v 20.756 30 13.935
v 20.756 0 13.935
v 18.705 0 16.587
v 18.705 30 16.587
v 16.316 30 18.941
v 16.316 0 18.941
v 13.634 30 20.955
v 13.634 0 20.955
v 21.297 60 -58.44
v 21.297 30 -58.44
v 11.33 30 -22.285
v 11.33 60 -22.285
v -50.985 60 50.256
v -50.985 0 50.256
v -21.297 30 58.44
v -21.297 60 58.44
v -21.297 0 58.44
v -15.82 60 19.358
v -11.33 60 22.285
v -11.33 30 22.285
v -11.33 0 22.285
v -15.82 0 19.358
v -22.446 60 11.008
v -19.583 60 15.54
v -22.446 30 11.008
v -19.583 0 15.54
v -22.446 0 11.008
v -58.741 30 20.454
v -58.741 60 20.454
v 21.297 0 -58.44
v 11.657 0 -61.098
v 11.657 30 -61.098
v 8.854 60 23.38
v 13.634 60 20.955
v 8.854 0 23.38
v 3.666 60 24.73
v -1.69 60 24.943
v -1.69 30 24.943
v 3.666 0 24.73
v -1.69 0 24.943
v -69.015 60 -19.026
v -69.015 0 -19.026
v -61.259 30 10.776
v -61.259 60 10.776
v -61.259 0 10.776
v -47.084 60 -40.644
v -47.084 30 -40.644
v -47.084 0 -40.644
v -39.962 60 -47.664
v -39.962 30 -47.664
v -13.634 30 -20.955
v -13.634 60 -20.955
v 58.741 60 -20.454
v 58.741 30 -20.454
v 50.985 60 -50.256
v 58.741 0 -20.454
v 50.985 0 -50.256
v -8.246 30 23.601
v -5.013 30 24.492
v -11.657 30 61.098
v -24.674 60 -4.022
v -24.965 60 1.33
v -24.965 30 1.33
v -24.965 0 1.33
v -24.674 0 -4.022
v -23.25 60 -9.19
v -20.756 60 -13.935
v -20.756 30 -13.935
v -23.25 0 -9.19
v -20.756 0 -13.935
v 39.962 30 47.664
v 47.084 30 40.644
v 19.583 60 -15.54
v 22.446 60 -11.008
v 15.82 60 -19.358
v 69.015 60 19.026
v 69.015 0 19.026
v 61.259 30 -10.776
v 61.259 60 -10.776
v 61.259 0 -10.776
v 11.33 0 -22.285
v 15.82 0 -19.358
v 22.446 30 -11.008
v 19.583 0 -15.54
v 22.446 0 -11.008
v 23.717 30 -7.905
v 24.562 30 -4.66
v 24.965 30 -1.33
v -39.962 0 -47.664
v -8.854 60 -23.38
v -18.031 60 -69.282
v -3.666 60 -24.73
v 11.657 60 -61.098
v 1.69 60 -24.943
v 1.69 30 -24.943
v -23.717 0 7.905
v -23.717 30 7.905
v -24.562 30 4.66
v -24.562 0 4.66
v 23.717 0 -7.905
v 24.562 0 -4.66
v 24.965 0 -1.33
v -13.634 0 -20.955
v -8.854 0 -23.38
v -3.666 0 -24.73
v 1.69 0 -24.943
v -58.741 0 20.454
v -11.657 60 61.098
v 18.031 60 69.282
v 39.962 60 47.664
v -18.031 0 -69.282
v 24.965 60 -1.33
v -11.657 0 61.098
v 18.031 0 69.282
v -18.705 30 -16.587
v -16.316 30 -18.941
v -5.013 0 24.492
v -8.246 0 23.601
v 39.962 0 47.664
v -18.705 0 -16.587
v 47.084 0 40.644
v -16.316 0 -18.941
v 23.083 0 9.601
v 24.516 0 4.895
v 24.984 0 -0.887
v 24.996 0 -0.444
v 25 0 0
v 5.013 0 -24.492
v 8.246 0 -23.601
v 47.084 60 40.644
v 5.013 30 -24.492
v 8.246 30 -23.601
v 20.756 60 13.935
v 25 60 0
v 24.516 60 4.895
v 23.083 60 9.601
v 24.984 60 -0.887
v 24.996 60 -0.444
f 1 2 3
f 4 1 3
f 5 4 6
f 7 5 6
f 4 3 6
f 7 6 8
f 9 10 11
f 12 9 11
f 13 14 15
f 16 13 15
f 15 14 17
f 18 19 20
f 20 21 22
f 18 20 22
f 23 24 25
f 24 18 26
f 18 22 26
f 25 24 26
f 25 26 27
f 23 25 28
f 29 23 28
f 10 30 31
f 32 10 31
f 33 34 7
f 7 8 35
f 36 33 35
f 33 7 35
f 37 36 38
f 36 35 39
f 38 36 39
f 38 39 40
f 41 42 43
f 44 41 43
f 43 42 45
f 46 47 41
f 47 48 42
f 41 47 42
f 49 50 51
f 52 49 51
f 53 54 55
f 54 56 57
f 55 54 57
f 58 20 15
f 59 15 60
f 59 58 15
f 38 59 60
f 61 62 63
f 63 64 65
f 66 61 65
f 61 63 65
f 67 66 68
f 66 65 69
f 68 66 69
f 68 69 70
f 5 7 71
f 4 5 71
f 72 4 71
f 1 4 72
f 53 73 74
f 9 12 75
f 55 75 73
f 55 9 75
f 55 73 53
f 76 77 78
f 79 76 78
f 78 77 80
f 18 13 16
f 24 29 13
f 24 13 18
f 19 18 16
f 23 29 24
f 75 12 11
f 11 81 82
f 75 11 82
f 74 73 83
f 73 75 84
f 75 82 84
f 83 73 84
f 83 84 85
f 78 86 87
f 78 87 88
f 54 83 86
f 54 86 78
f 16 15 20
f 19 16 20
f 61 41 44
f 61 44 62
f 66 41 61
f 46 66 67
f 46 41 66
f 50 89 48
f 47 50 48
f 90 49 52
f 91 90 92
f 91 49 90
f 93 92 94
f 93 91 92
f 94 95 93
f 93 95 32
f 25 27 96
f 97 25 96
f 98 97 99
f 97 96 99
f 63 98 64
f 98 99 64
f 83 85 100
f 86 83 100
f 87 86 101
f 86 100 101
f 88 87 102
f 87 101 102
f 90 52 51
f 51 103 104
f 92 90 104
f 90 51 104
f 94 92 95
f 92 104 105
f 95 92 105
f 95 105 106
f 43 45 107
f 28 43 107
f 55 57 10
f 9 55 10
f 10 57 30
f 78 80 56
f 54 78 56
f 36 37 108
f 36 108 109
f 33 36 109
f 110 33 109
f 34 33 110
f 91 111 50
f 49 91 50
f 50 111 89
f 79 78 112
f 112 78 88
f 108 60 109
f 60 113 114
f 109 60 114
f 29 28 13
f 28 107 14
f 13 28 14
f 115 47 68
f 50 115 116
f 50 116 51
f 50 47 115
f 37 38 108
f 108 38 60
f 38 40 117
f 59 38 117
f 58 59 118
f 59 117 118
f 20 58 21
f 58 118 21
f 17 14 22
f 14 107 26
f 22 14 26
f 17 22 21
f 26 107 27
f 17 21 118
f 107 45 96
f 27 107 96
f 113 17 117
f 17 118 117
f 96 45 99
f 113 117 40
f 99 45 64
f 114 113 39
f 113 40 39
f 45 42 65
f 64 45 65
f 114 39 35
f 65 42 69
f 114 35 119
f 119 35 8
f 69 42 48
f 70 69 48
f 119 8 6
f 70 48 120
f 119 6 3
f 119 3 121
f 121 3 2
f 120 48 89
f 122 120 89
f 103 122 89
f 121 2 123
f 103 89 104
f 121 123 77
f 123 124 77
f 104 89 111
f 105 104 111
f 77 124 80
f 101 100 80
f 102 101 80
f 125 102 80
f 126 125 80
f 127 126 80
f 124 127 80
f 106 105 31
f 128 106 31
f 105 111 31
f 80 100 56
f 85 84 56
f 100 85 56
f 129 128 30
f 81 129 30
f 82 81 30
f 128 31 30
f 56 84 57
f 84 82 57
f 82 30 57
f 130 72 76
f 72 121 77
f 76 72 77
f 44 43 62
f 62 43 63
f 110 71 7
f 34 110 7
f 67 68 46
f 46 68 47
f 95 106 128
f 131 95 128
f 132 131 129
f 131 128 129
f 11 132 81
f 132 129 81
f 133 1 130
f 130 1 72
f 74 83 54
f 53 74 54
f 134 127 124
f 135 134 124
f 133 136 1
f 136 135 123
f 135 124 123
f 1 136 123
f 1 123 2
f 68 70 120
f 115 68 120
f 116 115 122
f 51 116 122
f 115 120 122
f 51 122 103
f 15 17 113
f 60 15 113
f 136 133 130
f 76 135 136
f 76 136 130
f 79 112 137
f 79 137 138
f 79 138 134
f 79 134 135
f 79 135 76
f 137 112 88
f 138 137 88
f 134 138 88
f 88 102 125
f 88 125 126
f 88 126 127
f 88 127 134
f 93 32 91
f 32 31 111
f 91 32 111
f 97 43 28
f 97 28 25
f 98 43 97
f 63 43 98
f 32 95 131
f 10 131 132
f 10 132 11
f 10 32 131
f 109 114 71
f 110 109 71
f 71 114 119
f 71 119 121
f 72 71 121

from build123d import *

# Parameters (mm, degrees)
BOSS_EXTRUDE1_DEPTH   = 60
BOSS_EXTRUDE1_2_DEPTH = 60
BOSS_EXTRUDE1_3_DEPTH = 60
BOSS_EXTRUDE1_4_DEPTH = 60
BOSS_EXTRUDE1_5_DEPTH = 60
BOSS_EXTRUDE1_6_DEPTH = 60
BOSS_EXTRUDE2_DEPTH   = 30


with BuildPart() as part:
    # Sketch2 → Boss-Extrude1 (new body)
    with BuildSketch(Plane(origin=(0, 0, 0), x_dir=(1, 0, 0), z_dir=(0, 1, 0))):
        with BuildLine():
            Line((22.445988761, 11.008069246), (58.740707334, 20.453692353))
            Line((58.740707334, 20.453692353), (50.984749422, 50.255888195))
            Line((50.984749422, 50.255888195), (21.297311778, 58.440129534))
            Line((21.297311778, 58.440129534), (11.330102056, 22.285169674))
            ThreePointArc((11.330102056, 22.285169674), (17.804474894, 17.54994797), (22.445988761, 11.008069246))
        make_face()
    extrude(amount=BOSS_EXTRUDE1_DEPTH)



with BuildPart() as body_2:
    # Sketch2 → Boss-Extrude1 2 (new body)
    with BuildSketch(Plane(origin=(0, 0, 0), x_dir=(1, 0, 0), z_dir=(0, 1, 0))):
        with BuildLine():
            Line((69.015250578, -19.026144108), (61.259292666, 10.776051735))
            Line((61.259292666, 10.776051735), (24.964574093, 1.330428629))
            ThreePointArc((24.964574093, 1.330428629), (24.100938224, -6.644153574), (20.756261995, -13.934761857))
            Line((20.756261995, -13.934761857), (47.083770846, -40.644098611))
            Line((47.083770846, -40.644098611), (69.015250578, -19.026144108))
        make_face()
    extrude(amount=BOSS_EXTRUDE1_2_DEPTH)


with BuildPart() as body_3:
    # Sketch2 → Boss-Extrude1 3 (new body)
    with BuildSketch(Plane(origin=(0, 0, 0), x_dir=(1, 0, 0), z_dir=(0, 1, 0))):
        with BuildLine():
            ThreePointArc((-13.634472037, 20.954741045), (-6.29646333, 24.194101544), (1.689726767, 24.942831103))
            Line((1.689726767, 24.942831103), (11.656936488, 61.097790964))
            Line((11.656936488, 61.097790964), (-18.030501156, 69.282032303))
            Line((-18.030501156, 69.282032303), (-39.961980888, 47.664077799))
            Line((-39.961980888, 47.664077799), (-13.634472037, 20.954741045))
        make_face()
    extrude(amount=BOSS_EXTRUDE1_3_DEPTH)


with BuildPart() as body_4:
    # Sketch2 → Boss-Extrude1 4 (new body)
    with BuildSketch(Plane(origin=(0, 0, 0), x_dir=(1, 0, 0), z_dir=(0, 1, 0))):
        with BuildLine():
            Line((18.030501156, -69.282032303), (39.961980888, -47.664077799))
            Line((39.961980888, -47.664077799), (13.634472037, -20.954741045))
            ThreePointArc((13.634472037, -20.954741045), (6.29646333, -24.194101544), (-1.689726767, -24.942831103))
            Line((-1.689726767, -24.942831103), (-11.656936488, -61.097790964))
            Line((-11.656936488, -61.097790964), (18.030501156, -69.282032303))
        make_face()
    extrude(amount=BOSS_EXTRUDE1_4_DEPTH)


with BuildPart() as body_5:
    # Sketch2 → Boss-Extrude1 5 (new body)
    with BuildSketch(Plane(origin=(0, 0, 0), x_dir=(1, 0, 0), z_dir=(0, 1, 0))):
        with BuildLine():
            ThreePointArc((-24.964574093, -1.330428629), (-24.100938224, 6.644153574), (-20.756261995, 13.934761857))
            Line((-20.756261995, 13.934761857), (-47.083770846, 40.644098611))
            Line((-47.083770846, 40.644098611), (-69.015250578, 19.026144108))
            Line((-69.015250578, 19.026144108), (-61.259292666, -10.776051735))
            Line((-61.259292666, -10.776051735), (-24.964574093, -1.330428629))
        make_face()
    extrude(amount=BOSS_EXTRUDE1_5_DEPTH)


with BuildPart() as body_6:
    # Sketch2 → Boss-Extrude1 6 (new body)
    with BuildSketch(Plane(origin=(0, 0, 0), x_dir=(1, 0, 0), z_dir=(0, 1, 0))):
        with BuildLine():
            Line((-21.297311778, -58.440129534), (-11.330102056, -22.285169674))
            ThreePointArc((-11.330102056, -22.285169674), (-17.804474894, -17.54994797), (-22.445988761, -11.008069246))
            Line((-22.445988761, -11.008069246), (-58.740707334, -20.453692353))
            Line((-58.740707334, -20.453692353), (-50.984749422, -50.255888195))
            Line((-50.984749422, -50.255888195), (-21.297311778, -58.440129534))
        make_face()
    extrude(amount=BOSS_EXTRUDE1_6_DEPTH)


with BuildPart() as part_1:
    add(part.part)

    add(body_2.part)  # Boss-Extrude2 merges body 2

    add(body_3.part)  # Boss-Extrude2 merges body 3

    add(body_4.part)  # Boss-Extrude2 merges body 4

    add(body_5.part)  # Boss-Extrude2 merges body 5

    add(body_6.part)  # Boss-Extrude2 merges body 6
    # Sketch2<3> → Boss-Extrude2 (add)
    with BuildSketch(Plane(origin=(0, 0, 0), x_dir=(1, 0, 0), z_dir=(0, 1, 0))):
        with BuildLine():
            Line((61.259292666, 10.776051735), (58.740707334, 20.453692353))
            Line((58.740707334, 20.453692353), (22.445988761, 11.008069246))
            ThreePointArc((22.445988761, 11.008069246), (24.194101544, 6.29646333), (24.964574093, 1.330428629))
            Line((24.964574093, 1.330428629), (61.259292666, 10.776051735))
        make_face()
        with BuildLine():
            ThreePointArc((1.689726767, 24.942831103), (6.644153574, 24.100938224), (11.330102056, 22.285169674))
            Line((11.330102056, 22.285169674), (21.297311778, 58.440129534))
            Line((21.297311778, 58.440129534), (11.656936488, 61.097790964))
            Line((11.656936488, 61.097790964), (1.689726767, 24.942831103))
        make_face()
        with BuildLine():
            Line((39.961980888, -47.664077799), (47.083770846, -40.644098611))
            Line((47.083770846, -40.644098611), (20.756261995, -13.934761857))
            ThreePointArc((20.756261995, -13.934761857), (17.54994797, -17.804474894), (13.634472037, -20.954741045))
            Line((13.634472037, -20.954741045), (39.961980888, -47.664077799))
        make_face()
        with BuildLine():
            ThreePointArc((-20.756261995, 13.934761857), (-17.54994797, 17.804474894), (-13.634472037, 20.954741045))
            Line((-13.634472037, 20.954741045), (-39.961980888, 47.664077799))
            Line((-39.961980888, 47.664077799), (-47.083770846, 40.644098611))
            Line((-47.083770846, 40.644098611), (-20.756261995, 13.934761857))
        make_face()
        with BuildLine():
            Line((-11.656936488, -61.097790964), (-1.689726767, -24.942831103))
            ThreePointArc((-1.689726767, -24.942831103), (-6.644153574, -24.100938224), (-11.330102056, -22.285169674))
            Line((-11.330102056, -22.285169674), (-21.297311778, -58.440129534))
            Line((-21.297311778, -58.440129534), (-11.656936488, -61.097790964))
        make_face()
        with BuildLine():
            ThreePointArc((-22.445988761, -11.008069246), (-24.194101544, -6.29646333), (-24.964574093, -1.330428629))
            Line((-24.964574093, -1.330428629), (-61.259292666, -10.776051735))
            Line((-61.259292666, -10.776051735), (-58.740707334, -20.453692353))
            Line((-58.740707334, -20.453692353), (-22.445988761, -11.008069246))
        make_face()
    extrude(amount=BOSS_EXTRUDE2_DEPTH)


solid = part_1.part
